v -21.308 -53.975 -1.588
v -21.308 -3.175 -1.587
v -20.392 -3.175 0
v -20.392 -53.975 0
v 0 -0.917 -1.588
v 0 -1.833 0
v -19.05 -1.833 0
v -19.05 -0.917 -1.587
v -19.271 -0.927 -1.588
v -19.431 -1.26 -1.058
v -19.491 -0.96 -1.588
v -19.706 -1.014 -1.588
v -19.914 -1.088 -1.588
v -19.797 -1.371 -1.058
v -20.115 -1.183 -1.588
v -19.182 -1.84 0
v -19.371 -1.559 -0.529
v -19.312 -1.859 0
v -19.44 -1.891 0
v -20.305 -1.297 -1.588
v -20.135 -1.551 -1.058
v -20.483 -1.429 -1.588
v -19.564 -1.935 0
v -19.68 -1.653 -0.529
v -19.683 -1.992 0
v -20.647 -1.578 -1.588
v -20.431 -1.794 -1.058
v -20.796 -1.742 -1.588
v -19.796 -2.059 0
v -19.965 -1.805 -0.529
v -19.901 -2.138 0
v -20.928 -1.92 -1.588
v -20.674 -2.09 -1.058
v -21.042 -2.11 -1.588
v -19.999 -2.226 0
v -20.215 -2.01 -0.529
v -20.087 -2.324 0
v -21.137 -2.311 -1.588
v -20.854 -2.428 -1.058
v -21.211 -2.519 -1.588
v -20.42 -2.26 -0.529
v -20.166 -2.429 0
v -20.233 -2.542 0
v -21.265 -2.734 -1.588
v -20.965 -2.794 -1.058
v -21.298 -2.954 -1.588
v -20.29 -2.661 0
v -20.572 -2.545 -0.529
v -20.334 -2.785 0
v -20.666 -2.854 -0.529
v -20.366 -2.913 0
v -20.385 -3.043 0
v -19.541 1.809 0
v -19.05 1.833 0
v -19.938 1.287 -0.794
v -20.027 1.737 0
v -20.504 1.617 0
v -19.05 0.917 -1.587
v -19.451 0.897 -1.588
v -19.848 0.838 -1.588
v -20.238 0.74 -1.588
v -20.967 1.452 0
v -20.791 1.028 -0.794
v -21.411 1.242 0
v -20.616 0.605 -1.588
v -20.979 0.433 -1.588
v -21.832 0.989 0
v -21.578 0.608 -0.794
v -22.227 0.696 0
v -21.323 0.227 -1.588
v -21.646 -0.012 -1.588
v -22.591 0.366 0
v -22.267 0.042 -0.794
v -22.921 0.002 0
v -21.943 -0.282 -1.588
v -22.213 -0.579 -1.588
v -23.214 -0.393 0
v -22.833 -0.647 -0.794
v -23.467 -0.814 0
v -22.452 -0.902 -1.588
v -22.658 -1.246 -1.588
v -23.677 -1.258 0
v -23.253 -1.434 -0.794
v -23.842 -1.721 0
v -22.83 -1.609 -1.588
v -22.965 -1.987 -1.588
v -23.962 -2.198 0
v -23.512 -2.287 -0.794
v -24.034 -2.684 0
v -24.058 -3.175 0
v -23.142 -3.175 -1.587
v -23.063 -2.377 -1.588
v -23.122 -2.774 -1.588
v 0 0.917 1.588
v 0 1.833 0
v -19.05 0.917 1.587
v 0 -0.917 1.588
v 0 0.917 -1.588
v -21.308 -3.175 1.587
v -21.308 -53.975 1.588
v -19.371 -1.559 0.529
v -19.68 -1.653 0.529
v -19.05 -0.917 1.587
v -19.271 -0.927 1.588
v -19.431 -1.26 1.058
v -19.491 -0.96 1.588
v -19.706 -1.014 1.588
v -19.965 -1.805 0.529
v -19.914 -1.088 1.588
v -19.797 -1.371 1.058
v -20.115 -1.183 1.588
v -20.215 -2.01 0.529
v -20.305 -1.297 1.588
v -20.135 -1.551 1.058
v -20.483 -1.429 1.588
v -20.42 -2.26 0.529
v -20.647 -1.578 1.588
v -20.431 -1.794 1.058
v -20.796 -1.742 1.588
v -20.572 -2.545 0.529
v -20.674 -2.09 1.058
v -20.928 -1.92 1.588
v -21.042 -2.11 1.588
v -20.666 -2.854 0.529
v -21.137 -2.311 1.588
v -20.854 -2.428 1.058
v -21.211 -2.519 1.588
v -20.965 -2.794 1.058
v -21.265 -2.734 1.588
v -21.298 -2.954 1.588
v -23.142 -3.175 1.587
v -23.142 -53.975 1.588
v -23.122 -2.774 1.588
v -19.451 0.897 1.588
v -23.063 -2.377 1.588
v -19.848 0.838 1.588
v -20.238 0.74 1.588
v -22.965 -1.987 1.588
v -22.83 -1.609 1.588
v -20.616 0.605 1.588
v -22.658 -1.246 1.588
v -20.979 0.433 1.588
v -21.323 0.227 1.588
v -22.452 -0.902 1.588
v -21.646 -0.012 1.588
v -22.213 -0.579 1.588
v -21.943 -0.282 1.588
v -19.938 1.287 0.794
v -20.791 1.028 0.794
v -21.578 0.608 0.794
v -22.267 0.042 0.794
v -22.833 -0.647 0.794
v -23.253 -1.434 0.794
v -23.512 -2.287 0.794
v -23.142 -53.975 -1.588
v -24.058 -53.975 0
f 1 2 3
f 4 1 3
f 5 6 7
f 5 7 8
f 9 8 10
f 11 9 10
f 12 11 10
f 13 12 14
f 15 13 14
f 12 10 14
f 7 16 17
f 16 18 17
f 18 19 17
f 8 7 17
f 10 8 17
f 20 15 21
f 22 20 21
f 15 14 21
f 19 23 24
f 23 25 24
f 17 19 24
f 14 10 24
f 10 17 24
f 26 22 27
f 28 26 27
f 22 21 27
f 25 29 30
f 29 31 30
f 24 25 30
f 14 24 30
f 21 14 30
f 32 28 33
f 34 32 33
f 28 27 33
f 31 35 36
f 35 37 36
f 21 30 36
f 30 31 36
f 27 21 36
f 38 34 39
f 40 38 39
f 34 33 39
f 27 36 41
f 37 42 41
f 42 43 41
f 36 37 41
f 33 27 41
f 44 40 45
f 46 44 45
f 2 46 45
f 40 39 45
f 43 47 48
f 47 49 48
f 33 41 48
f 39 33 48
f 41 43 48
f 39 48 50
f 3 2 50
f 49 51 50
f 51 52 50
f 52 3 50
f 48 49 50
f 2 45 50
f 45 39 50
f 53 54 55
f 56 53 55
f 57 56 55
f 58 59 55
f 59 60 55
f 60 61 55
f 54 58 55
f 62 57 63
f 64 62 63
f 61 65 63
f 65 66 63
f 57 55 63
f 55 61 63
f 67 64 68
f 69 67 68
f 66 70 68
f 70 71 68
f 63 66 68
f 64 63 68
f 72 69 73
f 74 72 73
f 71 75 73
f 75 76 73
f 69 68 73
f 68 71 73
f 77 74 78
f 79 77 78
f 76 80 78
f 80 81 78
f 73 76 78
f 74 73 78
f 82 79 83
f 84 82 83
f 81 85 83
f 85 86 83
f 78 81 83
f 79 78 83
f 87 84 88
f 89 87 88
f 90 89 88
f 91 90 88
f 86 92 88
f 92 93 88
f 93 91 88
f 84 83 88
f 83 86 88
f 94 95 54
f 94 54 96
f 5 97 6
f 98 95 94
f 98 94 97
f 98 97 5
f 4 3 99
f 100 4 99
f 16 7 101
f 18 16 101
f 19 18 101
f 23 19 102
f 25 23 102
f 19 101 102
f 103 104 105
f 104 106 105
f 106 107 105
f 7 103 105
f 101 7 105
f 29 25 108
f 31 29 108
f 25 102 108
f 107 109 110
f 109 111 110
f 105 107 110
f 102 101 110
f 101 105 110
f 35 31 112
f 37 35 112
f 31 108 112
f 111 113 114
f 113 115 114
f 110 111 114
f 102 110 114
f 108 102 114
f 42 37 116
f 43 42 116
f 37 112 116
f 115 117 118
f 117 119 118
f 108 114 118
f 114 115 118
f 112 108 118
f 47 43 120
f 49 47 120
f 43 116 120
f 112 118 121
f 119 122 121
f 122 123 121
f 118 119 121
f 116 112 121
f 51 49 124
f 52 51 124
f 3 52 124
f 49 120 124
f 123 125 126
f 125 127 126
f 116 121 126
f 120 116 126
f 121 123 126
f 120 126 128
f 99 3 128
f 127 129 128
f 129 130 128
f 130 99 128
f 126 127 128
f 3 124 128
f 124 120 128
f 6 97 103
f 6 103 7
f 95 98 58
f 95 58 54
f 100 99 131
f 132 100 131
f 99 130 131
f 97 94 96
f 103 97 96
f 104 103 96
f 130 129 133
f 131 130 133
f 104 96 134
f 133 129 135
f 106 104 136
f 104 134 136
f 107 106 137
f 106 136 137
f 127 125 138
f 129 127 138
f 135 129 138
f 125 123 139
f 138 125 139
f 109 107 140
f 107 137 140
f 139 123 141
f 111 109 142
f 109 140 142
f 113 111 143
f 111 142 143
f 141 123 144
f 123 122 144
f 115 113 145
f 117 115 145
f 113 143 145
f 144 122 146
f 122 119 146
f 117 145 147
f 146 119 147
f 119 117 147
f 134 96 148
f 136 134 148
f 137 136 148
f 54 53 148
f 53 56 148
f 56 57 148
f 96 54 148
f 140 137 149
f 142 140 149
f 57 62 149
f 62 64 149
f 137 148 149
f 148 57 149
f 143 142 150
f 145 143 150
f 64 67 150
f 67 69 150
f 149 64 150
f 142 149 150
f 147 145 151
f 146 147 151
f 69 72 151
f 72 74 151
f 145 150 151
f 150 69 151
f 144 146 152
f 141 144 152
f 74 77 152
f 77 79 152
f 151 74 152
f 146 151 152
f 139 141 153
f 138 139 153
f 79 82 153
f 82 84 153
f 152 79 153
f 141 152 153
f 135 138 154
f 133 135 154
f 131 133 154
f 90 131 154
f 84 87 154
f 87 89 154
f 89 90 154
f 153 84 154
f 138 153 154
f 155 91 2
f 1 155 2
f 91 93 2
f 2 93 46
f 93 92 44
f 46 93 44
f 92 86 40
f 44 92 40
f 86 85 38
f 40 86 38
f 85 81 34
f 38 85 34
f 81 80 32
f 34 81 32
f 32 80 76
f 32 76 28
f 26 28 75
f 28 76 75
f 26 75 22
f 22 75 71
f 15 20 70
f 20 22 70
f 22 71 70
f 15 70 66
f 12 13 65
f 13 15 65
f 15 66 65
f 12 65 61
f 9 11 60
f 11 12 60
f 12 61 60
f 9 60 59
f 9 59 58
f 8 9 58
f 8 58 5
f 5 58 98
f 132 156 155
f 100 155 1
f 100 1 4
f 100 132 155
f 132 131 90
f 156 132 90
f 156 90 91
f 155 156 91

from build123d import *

# Parameters (mm, degrees)
BOSS_EXTRUDE1_DEPTH = 19.05
REVOLVE4_ANGLE      = 90
BOSS_EXTRUDE2_DEPTH = 50.8


with BuildPart() as part:
    # Sketch1 → Boss-Extrude1 (new body)
    with BuildSketch(Plane(origin=(0, 0, 0), x_dir=(0, 0, -1), z_dir=(1, 0, 0))):
        Polygon((1.5875, 0.916543552), (0, 1.833087105), (-1.5875, 0.916543552), (-1.5875, -0.916543552), (0, -1.833087105), (1.5875, -0.916543552), align=None)
    extrude(amount=-BOSS_EXTRUDE1_DEPTH)

    # Sketch3 → Revolve4 (revolve)
    with BuildSketch(Plane.ZY.offset(19.05)):
        Polygon((-1.5875, 0.916543552), (-1.5875, -0.916543552), (0, -1.833087105), (1.5875, -0.916543552), (1.5875, 0.916543552), (0, 1.833087105), align=None)
    revolve(axis=Axis((-19.05, -3.175, 0), (0, 0, 1)), revolution_arc=REVOLVE4_ANGLE)

    # Sketch4 → Boss-Extrude2 (add)
    with BuildSketch(Plane.XZ.offset(3.175)):
        Polygon((-24.058087105, 0), (-23.141543552, -1.5875), (-21.308456448, -1.5875), (-20.391912895, 0), (-21.308456448, 1.5875), (-23.141543552, 1.5875), align=None)
    extrude(amount=BOSS_EXTRUDE2_DEPTH)


solid = part.part
